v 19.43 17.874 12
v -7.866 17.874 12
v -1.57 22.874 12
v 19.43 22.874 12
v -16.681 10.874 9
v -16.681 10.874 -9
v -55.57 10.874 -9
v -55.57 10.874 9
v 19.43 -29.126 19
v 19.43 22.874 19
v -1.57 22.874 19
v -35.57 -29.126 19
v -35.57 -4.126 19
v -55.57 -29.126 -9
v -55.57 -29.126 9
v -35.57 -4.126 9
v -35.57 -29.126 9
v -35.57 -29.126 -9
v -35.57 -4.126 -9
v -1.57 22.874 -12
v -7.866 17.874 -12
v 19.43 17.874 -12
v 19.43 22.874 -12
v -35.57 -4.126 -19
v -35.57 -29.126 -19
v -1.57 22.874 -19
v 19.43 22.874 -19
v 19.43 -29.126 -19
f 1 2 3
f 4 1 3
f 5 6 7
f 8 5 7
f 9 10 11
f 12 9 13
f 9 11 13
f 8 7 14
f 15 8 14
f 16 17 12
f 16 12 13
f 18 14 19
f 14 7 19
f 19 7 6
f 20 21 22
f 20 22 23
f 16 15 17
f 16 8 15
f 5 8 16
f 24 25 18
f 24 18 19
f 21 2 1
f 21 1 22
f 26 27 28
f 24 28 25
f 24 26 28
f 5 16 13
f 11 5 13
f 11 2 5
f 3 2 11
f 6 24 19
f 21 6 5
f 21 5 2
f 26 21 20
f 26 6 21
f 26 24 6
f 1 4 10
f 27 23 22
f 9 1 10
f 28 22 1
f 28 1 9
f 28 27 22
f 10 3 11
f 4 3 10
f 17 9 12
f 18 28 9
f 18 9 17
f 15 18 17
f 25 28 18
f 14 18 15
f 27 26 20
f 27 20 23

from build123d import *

# Parameters (mm, degrees)
BOSS_EXTRUDE1_DEPTH      = 19
BOSS_EXTRUDE1_DEPTH_BACK = 19
BOSS_EXTRUDE2_DEPTH      = 9
BOSS_EXTRUDE2_DEPTH_BACK = 9
SKETCH2_W                = 24
SKETCH2_H                = 5
CUT_EXTRUDE2_DEPTH       = 76


with BuildPart() as part:
    # Sketch1 → Boss-Extrude1 (new, two sides: drawn at the far end of the back side and taken through both)
    with BuildSketch(Plane.XY.offset(-BOSS_EXTRUDE1_DEPTH_BACK)):
        Polygon((-35.570076419, -4.126221996), (-35.570076419, -29.126221996), (19.429923581, -29.126221996), (19.429923581, 22.873778004), (-1.570076419, 22.873778004), (-16.681187531, 10.873778004), align=None)
    extrude(amount=BOSS_EXTRUDE1_DEPTH + BOSS_EXTRUDE1_DEPTH_BACK)

    # Sketch1<3> → Boss-Extrude2 (add, two sides: drawn at the far end of the back side and taken through both)
    with BuildSketch(Plane.XY.offset(-BOSS_EXTRUDE2_DEPTH_BACK)):
        Polygon((-55.570076419, -29.126221996), (-35.570076419, -29.126221996), (-35.570076419, -4.126221996), (-16.681187531, 10.873778004), (-55.570076419, 10.873778004), align=None)
    extrude(amount=BOSS_EXTRUDE2_DEPTH + BOSS_EXTRUDE2_DEPTH_BACK)

    # Sketch2 → Cut-Extrude2 (cut)
    with BuildSketch(Plane(origin=(19.429923581, 0, 0), x_dir=(0, 0, -1), z_dir=(1, 0, 0))):
        with Locations((0, 20.373778004)):
            Rectangle(SKETCH2_W, SKETCH2_H)
    extrude(amount=-CUT_EXTRUDE2_DEPTH, mode=Mode.SUBTRACT)


solid = part.part
